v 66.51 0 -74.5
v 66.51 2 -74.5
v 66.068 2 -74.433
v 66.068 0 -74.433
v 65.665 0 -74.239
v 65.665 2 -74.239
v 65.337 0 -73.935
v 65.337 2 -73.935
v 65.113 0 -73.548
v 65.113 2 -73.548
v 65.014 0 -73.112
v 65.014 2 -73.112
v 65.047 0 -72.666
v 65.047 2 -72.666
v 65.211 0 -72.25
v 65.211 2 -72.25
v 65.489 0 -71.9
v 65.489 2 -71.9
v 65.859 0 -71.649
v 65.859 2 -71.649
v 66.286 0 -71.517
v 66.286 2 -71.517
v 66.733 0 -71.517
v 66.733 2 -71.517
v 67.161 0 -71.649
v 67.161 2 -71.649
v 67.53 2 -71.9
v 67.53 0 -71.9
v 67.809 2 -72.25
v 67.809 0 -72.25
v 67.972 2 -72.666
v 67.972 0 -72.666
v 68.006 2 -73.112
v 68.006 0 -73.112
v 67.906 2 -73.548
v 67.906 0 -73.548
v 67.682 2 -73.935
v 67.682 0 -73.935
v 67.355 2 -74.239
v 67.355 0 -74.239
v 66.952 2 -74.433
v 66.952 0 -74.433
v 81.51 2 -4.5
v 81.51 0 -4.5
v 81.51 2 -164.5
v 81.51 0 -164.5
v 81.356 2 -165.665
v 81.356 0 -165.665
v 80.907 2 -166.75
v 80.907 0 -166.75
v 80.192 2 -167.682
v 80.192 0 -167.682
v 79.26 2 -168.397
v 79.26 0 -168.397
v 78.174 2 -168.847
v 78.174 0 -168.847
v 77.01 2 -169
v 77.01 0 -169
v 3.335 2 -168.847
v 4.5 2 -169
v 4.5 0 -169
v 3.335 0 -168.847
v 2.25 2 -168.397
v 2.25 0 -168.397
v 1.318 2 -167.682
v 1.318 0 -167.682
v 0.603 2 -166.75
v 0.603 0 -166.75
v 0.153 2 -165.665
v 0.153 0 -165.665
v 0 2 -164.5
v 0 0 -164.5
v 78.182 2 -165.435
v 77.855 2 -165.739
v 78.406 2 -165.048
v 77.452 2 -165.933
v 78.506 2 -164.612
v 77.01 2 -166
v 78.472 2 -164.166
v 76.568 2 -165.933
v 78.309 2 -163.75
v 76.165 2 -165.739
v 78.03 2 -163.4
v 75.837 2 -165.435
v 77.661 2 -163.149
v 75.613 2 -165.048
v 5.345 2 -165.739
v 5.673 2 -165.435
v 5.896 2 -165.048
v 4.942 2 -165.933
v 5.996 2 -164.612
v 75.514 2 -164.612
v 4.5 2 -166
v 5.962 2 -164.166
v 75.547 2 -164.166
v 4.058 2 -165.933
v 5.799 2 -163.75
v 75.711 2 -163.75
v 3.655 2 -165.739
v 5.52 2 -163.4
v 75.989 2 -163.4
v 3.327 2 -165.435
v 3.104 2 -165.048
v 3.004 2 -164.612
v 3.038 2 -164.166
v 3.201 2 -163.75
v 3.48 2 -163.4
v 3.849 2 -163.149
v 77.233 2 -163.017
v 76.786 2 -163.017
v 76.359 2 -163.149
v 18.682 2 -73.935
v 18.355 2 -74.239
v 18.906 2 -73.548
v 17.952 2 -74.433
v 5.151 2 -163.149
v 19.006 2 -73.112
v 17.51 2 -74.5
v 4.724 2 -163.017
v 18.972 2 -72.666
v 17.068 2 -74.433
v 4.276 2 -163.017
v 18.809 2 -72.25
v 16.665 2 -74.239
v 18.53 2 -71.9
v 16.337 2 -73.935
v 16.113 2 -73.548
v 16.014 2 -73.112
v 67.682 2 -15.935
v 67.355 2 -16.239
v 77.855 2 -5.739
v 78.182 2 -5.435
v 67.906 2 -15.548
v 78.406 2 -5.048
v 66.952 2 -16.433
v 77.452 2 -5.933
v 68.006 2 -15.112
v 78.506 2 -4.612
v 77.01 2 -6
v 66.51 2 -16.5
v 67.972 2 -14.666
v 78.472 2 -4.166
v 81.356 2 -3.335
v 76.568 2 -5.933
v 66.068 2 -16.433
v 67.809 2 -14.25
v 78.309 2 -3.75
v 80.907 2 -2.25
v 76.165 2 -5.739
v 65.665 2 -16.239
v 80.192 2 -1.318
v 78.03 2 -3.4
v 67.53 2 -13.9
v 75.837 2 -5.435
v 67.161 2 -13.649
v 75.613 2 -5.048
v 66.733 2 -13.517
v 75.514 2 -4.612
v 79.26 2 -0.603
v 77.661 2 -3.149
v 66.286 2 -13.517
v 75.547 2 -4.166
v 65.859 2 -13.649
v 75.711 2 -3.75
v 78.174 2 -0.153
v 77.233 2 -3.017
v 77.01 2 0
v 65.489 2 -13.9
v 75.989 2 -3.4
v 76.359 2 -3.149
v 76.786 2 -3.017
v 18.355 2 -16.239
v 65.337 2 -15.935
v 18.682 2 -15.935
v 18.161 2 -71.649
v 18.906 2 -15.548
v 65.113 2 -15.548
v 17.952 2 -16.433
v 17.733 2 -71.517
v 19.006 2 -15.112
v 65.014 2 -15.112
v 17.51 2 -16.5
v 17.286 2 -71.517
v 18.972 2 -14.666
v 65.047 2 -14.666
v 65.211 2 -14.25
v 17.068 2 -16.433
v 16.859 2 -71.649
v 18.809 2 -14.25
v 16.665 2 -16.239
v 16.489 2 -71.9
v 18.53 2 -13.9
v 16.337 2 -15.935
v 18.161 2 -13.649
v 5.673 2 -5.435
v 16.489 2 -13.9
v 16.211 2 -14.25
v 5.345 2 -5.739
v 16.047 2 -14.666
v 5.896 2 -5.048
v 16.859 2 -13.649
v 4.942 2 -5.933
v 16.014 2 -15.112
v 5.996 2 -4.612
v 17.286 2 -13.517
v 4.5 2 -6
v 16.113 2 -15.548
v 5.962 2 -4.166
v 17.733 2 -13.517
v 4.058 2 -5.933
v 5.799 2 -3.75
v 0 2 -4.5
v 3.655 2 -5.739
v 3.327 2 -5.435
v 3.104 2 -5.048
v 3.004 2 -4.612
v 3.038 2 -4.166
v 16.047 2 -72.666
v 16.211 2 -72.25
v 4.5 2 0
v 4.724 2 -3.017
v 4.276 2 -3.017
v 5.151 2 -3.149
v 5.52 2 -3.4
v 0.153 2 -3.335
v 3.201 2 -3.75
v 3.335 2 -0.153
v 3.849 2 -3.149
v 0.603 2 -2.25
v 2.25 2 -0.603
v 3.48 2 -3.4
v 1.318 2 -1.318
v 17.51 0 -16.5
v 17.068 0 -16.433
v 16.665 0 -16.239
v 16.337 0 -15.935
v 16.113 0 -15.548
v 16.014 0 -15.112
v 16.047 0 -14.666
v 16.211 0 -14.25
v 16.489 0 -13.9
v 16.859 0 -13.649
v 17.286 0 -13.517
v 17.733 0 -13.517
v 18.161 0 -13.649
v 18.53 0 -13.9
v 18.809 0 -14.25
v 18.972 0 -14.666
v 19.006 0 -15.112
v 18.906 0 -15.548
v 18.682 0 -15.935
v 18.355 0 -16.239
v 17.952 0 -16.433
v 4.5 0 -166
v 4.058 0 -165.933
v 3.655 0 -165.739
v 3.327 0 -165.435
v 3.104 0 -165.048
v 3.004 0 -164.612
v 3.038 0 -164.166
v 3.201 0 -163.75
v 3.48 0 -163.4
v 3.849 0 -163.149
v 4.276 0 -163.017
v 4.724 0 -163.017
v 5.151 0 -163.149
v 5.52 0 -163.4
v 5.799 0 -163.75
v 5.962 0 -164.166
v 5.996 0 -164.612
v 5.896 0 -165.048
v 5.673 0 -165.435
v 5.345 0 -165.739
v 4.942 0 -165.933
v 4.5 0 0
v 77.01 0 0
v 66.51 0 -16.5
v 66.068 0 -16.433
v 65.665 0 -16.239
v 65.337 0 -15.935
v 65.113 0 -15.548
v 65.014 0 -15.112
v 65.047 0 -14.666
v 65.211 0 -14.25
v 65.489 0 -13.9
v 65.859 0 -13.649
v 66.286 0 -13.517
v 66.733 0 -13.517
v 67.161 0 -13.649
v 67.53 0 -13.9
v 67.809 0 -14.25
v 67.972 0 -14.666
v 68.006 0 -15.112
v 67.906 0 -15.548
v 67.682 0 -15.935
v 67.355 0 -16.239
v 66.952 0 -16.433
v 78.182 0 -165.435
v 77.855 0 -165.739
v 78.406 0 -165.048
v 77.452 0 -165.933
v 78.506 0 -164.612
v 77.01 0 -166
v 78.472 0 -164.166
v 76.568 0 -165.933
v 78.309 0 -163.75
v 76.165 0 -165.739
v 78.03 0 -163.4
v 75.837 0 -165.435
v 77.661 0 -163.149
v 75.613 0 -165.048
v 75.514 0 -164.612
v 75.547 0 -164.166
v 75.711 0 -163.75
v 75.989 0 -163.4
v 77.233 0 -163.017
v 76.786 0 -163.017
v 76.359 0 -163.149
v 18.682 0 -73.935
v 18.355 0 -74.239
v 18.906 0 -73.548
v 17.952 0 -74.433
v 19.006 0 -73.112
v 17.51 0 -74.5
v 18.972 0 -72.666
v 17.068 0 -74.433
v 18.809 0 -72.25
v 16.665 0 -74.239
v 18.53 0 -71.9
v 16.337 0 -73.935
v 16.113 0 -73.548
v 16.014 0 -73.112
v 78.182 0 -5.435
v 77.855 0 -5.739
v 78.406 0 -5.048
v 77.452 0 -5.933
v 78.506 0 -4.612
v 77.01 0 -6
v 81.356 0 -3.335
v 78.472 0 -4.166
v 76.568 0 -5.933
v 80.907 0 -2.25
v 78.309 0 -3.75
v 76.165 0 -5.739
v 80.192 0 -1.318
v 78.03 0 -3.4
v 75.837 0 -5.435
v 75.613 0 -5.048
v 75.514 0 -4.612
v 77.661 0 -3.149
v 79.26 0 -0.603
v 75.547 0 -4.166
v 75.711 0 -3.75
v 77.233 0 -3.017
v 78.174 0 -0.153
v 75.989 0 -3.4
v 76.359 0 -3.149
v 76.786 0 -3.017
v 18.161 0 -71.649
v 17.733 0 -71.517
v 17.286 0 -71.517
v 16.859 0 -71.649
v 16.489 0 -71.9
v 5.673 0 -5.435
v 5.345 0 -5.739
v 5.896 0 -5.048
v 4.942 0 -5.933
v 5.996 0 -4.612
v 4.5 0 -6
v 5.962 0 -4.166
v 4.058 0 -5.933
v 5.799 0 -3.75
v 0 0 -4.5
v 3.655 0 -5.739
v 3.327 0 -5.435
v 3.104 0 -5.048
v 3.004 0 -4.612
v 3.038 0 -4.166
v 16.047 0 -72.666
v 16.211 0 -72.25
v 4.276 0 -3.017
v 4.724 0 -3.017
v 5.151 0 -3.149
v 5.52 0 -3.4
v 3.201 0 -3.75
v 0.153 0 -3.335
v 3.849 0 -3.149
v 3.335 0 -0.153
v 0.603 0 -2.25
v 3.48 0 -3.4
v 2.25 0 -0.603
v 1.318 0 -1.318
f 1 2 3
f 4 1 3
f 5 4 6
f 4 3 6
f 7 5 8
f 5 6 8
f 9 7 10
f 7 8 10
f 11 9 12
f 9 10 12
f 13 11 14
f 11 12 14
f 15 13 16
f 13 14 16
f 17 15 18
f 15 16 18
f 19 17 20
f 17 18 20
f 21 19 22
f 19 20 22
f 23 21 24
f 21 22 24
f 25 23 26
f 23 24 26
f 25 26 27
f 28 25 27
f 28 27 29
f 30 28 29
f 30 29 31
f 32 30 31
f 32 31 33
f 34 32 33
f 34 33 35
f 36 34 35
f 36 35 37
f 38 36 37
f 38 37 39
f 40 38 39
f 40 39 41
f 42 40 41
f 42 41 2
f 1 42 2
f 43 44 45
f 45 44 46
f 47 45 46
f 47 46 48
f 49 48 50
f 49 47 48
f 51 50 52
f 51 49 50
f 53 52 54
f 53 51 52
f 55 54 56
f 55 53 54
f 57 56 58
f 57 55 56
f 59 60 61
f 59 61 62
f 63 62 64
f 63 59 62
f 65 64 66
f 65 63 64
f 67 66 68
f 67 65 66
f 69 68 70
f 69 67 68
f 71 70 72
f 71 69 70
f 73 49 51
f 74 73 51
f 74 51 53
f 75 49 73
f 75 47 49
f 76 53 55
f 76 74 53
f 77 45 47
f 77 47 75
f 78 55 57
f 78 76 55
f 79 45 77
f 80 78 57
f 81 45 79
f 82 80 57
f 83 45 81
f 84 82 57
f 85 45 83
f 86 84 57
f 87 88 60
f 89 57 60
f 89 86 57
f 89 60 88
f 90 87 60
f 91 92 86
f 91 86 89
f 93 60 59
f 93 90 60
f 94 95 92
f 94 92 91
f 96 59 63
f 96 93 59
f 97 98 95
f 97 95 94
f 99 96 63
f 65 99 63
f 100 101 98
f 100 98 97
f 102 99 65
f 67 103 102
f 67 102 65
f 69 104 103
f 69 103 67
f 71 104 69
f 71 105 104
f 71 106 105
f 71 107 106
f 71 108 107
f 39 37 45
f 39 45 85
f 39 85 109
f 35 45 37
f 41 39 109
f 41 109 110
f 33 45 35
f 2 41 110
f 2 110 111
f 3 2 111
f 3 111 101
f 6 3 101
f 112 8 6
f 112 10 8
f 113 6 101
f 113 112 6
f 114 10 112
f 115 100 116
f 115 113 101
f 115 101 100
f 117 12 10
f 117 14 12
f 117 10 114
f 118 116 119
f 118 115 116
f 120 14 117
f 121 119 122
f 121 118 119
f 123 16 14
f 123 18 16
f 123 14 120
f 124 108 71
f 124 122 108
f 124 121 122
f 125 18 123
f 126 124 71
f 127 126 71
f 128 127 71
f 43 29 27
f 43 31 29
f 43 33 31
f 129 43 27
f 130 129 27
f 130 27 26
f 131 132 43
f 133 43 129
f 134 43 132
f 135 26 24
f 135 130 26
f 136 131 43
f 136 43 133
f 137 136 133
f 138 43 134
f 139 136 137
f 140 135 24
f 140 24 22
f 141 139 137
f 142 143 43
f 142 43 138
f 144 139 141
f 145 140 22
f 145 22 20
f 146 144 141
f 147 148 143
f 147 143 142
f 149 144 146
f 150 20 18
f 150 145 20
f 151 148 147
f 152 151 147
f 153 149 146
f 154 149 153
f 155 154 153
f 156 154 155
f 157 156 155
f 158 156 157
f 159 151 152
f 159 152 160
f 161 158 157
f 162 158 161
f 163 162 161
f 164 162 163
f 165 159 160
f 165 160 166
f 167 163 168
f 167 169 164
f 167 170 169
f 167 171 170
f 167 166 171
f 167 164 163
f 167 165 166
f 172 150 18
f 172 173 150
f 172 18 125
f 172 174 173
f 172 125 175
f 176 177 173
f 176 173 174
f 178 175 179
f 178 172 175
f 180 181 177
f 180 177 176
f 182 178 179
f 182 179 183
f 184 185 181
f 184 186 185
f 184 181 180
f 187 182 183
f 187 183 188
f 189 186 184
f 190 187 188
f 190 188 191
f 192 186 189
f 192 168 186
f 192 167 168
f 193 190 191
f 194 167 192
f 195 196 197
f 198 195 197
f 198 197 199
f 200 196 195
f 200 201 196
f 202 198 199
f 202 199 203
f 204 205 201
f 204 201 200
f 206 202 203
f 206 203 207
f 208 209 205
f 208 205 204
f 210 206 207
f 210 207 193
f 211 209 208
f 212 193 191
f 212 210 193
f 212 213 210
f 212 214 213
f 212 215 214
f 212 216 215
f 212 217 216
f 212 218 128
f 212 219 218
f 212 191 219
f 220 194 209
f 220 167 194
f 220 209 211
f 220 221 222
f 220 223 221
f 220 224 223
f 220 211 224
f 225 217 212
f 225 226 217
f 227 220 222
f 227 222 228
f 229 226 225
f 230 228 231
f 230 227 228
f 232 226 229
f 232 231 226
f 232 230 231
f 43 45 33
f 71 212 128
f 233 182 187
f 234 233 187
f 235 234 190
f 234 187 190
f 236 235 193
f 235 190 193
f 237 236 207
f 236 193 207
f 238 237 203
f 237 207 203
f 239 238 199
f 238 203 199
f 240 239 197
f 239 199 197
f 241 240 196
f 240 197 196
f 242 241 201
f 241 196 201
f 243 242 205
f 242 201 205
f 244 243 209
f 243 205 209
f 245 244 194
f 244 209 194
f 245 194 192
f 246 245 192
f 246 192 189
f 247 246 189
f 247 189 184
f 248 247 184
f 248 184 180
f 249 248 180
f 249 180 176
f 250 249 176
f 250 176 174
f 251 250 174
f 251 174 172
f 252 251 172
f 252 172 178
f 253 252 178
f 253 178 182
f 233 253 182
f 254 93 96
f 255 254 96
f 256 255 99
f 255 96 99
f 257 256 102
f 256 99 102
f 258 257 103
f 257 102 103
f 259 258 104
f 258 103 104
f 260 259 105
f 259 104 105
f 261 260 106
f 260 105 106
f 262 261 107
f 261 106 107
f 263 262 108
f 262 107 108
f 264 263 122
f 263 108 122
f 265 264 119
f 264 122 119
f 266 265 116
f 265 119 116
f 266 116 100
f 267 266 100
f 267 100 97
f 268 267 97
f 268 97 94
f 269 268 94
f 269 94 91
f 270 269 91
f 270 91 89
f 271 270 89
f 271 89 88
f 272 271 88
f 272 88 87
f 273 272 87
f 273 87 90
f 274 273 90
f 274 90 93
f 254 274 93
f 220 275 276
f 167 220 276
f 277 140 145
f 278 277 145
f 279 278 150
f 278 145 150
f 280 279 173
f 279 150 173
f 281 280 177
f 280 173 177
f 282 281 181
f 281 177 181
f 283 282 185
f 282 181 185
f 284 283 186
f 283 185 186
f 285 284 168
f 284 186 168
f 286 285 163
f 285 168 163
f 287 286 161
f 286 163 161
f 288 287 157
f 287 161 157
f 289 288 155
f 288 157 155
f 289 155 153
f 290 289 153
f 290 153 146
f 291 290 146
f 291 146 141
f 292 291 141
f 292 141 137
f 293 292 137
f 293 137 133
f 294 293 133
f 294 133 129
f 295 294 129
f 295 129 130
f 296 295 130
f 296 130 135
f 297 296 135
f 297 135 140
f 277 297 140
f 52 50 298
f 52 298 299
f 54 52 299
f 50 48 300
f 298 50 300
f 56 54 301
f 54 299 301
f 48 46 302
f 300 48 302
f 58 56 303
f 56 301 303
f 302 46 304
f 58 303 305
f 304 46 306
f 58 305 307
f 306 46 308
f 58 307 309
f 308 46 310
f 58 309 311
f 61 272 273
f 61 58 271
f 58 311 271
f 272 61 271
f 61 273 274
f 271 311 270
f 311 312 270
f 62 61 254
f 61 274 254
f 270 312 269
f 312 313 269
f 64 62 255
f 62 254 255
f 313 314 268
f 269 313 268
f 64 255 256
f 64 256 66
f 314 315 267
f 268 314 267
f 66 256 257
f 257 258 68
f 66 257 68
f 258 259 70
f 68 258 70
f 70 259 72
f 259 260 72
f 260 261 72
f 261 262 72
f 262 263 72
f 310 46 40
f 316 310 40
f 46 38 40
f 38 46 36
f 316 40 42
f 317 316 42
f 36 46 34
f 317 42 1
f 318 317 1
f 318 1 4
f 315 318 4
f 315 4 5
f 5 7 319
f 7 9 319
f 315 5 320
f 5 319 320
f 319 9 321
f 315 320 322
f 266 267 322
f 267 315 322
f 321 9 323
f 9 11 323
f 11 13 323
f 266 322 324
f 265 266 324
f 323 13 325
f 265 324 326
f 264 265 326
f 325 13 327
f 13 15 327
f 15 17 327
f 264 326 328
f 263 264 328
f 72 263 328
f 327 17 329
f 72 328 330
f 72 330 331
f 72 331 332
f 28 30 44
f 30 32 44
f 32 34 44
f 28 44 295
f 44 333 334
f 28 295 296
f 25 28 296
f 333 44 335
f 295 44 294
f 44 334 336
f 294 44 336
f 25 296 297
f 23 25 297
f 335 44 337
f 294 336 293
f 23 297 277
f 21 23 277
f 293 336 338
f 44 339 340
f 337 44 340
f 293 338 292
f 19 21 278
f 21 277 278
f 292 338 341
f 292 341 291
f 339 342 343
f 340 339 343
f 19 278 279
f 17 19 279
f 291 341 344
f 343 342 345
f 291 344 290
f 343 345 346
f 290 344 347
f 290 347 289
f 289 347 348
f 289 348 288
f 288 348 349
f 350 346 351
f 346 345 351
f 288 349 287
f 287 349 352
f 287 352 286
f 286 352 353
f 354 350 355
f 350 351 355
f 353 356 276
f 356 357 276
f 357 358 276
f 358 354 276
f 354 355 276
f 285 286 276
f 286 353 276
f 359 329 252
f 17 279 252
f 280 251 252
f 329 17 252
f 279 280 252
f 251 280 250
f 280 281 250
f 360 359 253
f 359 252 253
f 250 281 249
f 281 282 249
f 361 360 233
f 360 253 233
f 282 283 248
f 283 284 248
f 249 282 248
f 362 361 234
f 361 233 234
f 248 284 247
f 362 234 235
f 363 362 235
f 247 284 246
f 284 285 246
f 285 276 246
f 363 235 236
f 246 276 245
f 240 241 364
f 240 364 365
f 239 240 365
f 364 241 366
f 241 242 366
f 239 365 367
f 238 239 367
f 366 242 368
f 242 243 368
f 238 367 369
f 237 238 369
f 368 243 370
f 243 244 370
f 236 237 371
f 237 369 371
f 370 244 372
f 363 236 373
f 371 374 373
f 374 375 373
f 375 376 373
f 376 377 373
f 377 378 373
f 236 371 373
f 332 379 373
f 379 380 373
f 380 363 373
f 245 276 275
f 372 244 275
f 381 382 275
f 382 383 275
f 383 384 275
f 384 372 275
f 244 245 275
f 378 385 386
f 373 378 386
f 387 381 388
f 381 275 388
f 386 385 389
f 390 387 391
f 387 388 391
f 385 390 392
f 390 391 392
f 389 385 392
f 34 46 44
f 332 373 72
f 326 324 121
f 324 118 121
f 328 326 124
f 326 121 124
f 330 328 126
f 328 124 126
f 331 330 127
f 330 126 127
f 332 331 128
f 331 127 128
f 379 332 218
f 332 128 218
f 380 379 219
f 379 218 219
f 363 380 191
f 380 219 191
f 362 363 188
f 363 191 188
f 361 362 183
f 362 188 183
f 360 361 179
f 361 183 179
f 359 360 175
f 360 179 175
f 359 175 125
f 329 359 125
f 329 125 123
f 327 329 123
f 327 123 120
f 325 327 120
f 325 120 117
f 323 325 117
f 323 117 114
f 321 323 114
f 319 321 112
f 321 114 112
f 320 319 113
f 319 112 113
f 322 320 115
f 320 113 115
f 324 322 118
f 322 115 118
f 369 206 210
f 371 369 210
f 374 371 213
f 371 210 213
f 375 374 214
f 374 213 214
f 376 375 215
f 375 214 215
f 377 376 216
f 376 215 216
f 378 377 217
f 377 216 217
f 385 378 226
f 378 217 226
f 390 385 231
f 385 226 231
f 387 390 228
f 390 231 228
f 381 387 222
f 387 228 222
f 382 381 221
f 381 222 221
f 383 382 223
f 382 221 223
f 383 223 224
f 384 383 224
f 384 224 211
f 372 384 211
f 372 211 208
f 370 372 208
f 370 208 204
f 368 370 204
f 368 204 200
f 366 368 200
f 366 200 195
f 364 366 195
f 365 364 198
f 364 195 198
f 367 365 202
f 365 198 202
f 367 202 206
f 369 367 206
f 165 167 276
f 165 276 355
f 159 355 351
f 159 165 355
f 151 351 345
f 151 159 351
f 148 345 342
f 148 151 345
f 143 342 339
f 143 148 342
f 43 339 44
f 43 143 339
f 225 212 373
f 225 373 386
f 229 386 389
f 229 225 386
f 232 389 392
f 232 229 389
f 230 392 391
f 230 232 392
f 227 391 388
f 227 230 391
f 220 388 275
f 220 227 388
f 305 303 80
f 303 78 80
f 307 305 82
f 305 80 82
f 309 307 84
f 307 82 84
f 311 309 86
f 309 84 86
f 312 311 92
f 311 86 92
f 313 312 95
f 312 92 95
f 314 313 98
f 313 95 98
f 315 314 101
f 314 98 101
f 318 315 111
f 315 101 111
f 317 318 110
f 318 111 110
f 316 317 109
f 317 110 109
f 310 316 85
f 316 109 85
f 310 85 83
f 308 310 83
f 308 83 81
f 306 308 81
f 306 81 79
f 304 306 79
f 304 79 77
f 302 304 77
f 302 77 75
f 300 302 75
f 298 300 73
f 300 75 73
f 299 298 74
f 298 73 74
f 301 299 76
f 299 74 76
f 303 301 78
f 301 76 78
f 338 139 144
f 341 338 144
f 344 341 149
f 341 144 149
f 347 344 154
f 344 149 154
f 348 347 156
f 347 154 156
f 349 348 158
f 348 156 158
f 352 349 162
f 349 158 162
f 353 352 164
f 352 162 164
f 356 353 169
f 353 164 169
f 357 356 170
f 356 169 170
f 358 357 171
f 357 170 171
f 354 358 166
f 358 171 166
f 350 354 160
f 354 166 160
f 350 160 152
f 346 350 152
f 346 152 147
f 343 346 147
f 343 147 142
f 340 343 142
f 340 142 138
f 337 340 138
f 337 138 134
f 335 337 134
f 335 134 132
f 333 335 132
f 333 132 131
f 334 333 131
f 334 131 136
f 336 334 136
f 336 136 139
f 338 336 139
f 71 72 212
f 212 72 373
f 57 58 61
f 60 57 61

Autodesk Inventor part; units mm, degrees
ref_plane "YZ Plane" through (0, 0, 0) normal (1, 0, 0) x (0, 1, 0)
ref_plane "XZ Plane" through (0, 0, 0) normal (0, 1, 0) x (-1, 0, 0)
ref_plane "XY Plane" through (0, 0, 0) normal (0, 0, 1) x (1, 0, 0)
sketch "スケッチ1" plane through (0, 0, 0) normal (0, 1, 0) x (-1, 0, 0)
  line L0 (0, 0) -> (-81.5097, 0)
  line L1 (-81.5097, 0) -> (-81.5097, -169)
  line L2 (-81.5097, -169) -> (0, -169)
  line L3 (0, -169) -> (0, 0)
  dimension "d0" = 169
  dimension "d7" = 81.5097
extrude "押し出し1" add sketch "スケッチ1" along normal blind 2
fillet "フィレット1" radius 4.5 4 edges at (81.5097, 1, 0) (0, 1, 0) (81.5097, 1, -169) (0, 1, -169)
sketch "スケッチ3" plane through (0, 0, 0) normal (0, -1, 0) x (1, 0, 0)
  line L0 (81.5097, -4.5) -> (81.5097, -164.5) projected
  line L1 (0, -164.5) -> (0, -4.5) projected
  line L2 (77.0097, -169) -> (4.5, -169) projected
  line L3 (4.5, 0) -> (77.0097, 0) projected
  point P0 (0, 0)
  point P1 (77.0097, -4.5)
  point P2 (77.0097, -164.5)
  point P3 (4.5, -164.5)
  point P4 (4.5, -4.5)
  dimension "d34" = 4.5
  dimension "d35" = 4.5
  dimension "d36" = 4.5
  dimension "d37" = 4.5
  dimension "d38" = 4.5
  dimension "d39" = 4.5
  dimension "d40" = 4.5
  dimension "d41" = 4.5
hole "穴2" at (77.0097, 0, -4.5) at (77.0097, 0, -164.5) at (4.5, 0, -164.5) at (4.5, 0, -4.5) direction (0, 1, 0) diameter 3 end through all
sketch "スケッチ4" plane through (0, 0, 0) normal (0, -1, 0) x (1, 0, 0)
  line L0 (66.5097, -73) -> (17.5097, -73)
  line L1 (17.5097, -73) -> (17.5097, -15)
  line L2 (17.5097, -15) -> (66.5097, -15)
  line L3 (66.5097, -15) -> (66.5097, -73)
  line L4 (81.5097, -4.5) -> (81.5097, -164.5) projected
  line L5 (4.5, 0) -> (77.0097, 0) projected
  point P0 (0, 0)
  dimension "d49" = 49
  dimension "d50" = 58
  dimension "d51" = 15
  dimension "d52" = 15
hole "穴3" at (66.5097, 0, -73) at (17.5097, 0, -73) at (17.5097, 0, -15) at (66.5097, 0, -15) direction (0, 1, 0) diameter 3 end through all
ref_plane "作業平面1" through (81.5097, 2, 0) normal (-1, 0, 0) x (0, 0, -1)
properties part number "ロボット回転_回路ボード1_CPY" material "木材 (カエデ材)"
